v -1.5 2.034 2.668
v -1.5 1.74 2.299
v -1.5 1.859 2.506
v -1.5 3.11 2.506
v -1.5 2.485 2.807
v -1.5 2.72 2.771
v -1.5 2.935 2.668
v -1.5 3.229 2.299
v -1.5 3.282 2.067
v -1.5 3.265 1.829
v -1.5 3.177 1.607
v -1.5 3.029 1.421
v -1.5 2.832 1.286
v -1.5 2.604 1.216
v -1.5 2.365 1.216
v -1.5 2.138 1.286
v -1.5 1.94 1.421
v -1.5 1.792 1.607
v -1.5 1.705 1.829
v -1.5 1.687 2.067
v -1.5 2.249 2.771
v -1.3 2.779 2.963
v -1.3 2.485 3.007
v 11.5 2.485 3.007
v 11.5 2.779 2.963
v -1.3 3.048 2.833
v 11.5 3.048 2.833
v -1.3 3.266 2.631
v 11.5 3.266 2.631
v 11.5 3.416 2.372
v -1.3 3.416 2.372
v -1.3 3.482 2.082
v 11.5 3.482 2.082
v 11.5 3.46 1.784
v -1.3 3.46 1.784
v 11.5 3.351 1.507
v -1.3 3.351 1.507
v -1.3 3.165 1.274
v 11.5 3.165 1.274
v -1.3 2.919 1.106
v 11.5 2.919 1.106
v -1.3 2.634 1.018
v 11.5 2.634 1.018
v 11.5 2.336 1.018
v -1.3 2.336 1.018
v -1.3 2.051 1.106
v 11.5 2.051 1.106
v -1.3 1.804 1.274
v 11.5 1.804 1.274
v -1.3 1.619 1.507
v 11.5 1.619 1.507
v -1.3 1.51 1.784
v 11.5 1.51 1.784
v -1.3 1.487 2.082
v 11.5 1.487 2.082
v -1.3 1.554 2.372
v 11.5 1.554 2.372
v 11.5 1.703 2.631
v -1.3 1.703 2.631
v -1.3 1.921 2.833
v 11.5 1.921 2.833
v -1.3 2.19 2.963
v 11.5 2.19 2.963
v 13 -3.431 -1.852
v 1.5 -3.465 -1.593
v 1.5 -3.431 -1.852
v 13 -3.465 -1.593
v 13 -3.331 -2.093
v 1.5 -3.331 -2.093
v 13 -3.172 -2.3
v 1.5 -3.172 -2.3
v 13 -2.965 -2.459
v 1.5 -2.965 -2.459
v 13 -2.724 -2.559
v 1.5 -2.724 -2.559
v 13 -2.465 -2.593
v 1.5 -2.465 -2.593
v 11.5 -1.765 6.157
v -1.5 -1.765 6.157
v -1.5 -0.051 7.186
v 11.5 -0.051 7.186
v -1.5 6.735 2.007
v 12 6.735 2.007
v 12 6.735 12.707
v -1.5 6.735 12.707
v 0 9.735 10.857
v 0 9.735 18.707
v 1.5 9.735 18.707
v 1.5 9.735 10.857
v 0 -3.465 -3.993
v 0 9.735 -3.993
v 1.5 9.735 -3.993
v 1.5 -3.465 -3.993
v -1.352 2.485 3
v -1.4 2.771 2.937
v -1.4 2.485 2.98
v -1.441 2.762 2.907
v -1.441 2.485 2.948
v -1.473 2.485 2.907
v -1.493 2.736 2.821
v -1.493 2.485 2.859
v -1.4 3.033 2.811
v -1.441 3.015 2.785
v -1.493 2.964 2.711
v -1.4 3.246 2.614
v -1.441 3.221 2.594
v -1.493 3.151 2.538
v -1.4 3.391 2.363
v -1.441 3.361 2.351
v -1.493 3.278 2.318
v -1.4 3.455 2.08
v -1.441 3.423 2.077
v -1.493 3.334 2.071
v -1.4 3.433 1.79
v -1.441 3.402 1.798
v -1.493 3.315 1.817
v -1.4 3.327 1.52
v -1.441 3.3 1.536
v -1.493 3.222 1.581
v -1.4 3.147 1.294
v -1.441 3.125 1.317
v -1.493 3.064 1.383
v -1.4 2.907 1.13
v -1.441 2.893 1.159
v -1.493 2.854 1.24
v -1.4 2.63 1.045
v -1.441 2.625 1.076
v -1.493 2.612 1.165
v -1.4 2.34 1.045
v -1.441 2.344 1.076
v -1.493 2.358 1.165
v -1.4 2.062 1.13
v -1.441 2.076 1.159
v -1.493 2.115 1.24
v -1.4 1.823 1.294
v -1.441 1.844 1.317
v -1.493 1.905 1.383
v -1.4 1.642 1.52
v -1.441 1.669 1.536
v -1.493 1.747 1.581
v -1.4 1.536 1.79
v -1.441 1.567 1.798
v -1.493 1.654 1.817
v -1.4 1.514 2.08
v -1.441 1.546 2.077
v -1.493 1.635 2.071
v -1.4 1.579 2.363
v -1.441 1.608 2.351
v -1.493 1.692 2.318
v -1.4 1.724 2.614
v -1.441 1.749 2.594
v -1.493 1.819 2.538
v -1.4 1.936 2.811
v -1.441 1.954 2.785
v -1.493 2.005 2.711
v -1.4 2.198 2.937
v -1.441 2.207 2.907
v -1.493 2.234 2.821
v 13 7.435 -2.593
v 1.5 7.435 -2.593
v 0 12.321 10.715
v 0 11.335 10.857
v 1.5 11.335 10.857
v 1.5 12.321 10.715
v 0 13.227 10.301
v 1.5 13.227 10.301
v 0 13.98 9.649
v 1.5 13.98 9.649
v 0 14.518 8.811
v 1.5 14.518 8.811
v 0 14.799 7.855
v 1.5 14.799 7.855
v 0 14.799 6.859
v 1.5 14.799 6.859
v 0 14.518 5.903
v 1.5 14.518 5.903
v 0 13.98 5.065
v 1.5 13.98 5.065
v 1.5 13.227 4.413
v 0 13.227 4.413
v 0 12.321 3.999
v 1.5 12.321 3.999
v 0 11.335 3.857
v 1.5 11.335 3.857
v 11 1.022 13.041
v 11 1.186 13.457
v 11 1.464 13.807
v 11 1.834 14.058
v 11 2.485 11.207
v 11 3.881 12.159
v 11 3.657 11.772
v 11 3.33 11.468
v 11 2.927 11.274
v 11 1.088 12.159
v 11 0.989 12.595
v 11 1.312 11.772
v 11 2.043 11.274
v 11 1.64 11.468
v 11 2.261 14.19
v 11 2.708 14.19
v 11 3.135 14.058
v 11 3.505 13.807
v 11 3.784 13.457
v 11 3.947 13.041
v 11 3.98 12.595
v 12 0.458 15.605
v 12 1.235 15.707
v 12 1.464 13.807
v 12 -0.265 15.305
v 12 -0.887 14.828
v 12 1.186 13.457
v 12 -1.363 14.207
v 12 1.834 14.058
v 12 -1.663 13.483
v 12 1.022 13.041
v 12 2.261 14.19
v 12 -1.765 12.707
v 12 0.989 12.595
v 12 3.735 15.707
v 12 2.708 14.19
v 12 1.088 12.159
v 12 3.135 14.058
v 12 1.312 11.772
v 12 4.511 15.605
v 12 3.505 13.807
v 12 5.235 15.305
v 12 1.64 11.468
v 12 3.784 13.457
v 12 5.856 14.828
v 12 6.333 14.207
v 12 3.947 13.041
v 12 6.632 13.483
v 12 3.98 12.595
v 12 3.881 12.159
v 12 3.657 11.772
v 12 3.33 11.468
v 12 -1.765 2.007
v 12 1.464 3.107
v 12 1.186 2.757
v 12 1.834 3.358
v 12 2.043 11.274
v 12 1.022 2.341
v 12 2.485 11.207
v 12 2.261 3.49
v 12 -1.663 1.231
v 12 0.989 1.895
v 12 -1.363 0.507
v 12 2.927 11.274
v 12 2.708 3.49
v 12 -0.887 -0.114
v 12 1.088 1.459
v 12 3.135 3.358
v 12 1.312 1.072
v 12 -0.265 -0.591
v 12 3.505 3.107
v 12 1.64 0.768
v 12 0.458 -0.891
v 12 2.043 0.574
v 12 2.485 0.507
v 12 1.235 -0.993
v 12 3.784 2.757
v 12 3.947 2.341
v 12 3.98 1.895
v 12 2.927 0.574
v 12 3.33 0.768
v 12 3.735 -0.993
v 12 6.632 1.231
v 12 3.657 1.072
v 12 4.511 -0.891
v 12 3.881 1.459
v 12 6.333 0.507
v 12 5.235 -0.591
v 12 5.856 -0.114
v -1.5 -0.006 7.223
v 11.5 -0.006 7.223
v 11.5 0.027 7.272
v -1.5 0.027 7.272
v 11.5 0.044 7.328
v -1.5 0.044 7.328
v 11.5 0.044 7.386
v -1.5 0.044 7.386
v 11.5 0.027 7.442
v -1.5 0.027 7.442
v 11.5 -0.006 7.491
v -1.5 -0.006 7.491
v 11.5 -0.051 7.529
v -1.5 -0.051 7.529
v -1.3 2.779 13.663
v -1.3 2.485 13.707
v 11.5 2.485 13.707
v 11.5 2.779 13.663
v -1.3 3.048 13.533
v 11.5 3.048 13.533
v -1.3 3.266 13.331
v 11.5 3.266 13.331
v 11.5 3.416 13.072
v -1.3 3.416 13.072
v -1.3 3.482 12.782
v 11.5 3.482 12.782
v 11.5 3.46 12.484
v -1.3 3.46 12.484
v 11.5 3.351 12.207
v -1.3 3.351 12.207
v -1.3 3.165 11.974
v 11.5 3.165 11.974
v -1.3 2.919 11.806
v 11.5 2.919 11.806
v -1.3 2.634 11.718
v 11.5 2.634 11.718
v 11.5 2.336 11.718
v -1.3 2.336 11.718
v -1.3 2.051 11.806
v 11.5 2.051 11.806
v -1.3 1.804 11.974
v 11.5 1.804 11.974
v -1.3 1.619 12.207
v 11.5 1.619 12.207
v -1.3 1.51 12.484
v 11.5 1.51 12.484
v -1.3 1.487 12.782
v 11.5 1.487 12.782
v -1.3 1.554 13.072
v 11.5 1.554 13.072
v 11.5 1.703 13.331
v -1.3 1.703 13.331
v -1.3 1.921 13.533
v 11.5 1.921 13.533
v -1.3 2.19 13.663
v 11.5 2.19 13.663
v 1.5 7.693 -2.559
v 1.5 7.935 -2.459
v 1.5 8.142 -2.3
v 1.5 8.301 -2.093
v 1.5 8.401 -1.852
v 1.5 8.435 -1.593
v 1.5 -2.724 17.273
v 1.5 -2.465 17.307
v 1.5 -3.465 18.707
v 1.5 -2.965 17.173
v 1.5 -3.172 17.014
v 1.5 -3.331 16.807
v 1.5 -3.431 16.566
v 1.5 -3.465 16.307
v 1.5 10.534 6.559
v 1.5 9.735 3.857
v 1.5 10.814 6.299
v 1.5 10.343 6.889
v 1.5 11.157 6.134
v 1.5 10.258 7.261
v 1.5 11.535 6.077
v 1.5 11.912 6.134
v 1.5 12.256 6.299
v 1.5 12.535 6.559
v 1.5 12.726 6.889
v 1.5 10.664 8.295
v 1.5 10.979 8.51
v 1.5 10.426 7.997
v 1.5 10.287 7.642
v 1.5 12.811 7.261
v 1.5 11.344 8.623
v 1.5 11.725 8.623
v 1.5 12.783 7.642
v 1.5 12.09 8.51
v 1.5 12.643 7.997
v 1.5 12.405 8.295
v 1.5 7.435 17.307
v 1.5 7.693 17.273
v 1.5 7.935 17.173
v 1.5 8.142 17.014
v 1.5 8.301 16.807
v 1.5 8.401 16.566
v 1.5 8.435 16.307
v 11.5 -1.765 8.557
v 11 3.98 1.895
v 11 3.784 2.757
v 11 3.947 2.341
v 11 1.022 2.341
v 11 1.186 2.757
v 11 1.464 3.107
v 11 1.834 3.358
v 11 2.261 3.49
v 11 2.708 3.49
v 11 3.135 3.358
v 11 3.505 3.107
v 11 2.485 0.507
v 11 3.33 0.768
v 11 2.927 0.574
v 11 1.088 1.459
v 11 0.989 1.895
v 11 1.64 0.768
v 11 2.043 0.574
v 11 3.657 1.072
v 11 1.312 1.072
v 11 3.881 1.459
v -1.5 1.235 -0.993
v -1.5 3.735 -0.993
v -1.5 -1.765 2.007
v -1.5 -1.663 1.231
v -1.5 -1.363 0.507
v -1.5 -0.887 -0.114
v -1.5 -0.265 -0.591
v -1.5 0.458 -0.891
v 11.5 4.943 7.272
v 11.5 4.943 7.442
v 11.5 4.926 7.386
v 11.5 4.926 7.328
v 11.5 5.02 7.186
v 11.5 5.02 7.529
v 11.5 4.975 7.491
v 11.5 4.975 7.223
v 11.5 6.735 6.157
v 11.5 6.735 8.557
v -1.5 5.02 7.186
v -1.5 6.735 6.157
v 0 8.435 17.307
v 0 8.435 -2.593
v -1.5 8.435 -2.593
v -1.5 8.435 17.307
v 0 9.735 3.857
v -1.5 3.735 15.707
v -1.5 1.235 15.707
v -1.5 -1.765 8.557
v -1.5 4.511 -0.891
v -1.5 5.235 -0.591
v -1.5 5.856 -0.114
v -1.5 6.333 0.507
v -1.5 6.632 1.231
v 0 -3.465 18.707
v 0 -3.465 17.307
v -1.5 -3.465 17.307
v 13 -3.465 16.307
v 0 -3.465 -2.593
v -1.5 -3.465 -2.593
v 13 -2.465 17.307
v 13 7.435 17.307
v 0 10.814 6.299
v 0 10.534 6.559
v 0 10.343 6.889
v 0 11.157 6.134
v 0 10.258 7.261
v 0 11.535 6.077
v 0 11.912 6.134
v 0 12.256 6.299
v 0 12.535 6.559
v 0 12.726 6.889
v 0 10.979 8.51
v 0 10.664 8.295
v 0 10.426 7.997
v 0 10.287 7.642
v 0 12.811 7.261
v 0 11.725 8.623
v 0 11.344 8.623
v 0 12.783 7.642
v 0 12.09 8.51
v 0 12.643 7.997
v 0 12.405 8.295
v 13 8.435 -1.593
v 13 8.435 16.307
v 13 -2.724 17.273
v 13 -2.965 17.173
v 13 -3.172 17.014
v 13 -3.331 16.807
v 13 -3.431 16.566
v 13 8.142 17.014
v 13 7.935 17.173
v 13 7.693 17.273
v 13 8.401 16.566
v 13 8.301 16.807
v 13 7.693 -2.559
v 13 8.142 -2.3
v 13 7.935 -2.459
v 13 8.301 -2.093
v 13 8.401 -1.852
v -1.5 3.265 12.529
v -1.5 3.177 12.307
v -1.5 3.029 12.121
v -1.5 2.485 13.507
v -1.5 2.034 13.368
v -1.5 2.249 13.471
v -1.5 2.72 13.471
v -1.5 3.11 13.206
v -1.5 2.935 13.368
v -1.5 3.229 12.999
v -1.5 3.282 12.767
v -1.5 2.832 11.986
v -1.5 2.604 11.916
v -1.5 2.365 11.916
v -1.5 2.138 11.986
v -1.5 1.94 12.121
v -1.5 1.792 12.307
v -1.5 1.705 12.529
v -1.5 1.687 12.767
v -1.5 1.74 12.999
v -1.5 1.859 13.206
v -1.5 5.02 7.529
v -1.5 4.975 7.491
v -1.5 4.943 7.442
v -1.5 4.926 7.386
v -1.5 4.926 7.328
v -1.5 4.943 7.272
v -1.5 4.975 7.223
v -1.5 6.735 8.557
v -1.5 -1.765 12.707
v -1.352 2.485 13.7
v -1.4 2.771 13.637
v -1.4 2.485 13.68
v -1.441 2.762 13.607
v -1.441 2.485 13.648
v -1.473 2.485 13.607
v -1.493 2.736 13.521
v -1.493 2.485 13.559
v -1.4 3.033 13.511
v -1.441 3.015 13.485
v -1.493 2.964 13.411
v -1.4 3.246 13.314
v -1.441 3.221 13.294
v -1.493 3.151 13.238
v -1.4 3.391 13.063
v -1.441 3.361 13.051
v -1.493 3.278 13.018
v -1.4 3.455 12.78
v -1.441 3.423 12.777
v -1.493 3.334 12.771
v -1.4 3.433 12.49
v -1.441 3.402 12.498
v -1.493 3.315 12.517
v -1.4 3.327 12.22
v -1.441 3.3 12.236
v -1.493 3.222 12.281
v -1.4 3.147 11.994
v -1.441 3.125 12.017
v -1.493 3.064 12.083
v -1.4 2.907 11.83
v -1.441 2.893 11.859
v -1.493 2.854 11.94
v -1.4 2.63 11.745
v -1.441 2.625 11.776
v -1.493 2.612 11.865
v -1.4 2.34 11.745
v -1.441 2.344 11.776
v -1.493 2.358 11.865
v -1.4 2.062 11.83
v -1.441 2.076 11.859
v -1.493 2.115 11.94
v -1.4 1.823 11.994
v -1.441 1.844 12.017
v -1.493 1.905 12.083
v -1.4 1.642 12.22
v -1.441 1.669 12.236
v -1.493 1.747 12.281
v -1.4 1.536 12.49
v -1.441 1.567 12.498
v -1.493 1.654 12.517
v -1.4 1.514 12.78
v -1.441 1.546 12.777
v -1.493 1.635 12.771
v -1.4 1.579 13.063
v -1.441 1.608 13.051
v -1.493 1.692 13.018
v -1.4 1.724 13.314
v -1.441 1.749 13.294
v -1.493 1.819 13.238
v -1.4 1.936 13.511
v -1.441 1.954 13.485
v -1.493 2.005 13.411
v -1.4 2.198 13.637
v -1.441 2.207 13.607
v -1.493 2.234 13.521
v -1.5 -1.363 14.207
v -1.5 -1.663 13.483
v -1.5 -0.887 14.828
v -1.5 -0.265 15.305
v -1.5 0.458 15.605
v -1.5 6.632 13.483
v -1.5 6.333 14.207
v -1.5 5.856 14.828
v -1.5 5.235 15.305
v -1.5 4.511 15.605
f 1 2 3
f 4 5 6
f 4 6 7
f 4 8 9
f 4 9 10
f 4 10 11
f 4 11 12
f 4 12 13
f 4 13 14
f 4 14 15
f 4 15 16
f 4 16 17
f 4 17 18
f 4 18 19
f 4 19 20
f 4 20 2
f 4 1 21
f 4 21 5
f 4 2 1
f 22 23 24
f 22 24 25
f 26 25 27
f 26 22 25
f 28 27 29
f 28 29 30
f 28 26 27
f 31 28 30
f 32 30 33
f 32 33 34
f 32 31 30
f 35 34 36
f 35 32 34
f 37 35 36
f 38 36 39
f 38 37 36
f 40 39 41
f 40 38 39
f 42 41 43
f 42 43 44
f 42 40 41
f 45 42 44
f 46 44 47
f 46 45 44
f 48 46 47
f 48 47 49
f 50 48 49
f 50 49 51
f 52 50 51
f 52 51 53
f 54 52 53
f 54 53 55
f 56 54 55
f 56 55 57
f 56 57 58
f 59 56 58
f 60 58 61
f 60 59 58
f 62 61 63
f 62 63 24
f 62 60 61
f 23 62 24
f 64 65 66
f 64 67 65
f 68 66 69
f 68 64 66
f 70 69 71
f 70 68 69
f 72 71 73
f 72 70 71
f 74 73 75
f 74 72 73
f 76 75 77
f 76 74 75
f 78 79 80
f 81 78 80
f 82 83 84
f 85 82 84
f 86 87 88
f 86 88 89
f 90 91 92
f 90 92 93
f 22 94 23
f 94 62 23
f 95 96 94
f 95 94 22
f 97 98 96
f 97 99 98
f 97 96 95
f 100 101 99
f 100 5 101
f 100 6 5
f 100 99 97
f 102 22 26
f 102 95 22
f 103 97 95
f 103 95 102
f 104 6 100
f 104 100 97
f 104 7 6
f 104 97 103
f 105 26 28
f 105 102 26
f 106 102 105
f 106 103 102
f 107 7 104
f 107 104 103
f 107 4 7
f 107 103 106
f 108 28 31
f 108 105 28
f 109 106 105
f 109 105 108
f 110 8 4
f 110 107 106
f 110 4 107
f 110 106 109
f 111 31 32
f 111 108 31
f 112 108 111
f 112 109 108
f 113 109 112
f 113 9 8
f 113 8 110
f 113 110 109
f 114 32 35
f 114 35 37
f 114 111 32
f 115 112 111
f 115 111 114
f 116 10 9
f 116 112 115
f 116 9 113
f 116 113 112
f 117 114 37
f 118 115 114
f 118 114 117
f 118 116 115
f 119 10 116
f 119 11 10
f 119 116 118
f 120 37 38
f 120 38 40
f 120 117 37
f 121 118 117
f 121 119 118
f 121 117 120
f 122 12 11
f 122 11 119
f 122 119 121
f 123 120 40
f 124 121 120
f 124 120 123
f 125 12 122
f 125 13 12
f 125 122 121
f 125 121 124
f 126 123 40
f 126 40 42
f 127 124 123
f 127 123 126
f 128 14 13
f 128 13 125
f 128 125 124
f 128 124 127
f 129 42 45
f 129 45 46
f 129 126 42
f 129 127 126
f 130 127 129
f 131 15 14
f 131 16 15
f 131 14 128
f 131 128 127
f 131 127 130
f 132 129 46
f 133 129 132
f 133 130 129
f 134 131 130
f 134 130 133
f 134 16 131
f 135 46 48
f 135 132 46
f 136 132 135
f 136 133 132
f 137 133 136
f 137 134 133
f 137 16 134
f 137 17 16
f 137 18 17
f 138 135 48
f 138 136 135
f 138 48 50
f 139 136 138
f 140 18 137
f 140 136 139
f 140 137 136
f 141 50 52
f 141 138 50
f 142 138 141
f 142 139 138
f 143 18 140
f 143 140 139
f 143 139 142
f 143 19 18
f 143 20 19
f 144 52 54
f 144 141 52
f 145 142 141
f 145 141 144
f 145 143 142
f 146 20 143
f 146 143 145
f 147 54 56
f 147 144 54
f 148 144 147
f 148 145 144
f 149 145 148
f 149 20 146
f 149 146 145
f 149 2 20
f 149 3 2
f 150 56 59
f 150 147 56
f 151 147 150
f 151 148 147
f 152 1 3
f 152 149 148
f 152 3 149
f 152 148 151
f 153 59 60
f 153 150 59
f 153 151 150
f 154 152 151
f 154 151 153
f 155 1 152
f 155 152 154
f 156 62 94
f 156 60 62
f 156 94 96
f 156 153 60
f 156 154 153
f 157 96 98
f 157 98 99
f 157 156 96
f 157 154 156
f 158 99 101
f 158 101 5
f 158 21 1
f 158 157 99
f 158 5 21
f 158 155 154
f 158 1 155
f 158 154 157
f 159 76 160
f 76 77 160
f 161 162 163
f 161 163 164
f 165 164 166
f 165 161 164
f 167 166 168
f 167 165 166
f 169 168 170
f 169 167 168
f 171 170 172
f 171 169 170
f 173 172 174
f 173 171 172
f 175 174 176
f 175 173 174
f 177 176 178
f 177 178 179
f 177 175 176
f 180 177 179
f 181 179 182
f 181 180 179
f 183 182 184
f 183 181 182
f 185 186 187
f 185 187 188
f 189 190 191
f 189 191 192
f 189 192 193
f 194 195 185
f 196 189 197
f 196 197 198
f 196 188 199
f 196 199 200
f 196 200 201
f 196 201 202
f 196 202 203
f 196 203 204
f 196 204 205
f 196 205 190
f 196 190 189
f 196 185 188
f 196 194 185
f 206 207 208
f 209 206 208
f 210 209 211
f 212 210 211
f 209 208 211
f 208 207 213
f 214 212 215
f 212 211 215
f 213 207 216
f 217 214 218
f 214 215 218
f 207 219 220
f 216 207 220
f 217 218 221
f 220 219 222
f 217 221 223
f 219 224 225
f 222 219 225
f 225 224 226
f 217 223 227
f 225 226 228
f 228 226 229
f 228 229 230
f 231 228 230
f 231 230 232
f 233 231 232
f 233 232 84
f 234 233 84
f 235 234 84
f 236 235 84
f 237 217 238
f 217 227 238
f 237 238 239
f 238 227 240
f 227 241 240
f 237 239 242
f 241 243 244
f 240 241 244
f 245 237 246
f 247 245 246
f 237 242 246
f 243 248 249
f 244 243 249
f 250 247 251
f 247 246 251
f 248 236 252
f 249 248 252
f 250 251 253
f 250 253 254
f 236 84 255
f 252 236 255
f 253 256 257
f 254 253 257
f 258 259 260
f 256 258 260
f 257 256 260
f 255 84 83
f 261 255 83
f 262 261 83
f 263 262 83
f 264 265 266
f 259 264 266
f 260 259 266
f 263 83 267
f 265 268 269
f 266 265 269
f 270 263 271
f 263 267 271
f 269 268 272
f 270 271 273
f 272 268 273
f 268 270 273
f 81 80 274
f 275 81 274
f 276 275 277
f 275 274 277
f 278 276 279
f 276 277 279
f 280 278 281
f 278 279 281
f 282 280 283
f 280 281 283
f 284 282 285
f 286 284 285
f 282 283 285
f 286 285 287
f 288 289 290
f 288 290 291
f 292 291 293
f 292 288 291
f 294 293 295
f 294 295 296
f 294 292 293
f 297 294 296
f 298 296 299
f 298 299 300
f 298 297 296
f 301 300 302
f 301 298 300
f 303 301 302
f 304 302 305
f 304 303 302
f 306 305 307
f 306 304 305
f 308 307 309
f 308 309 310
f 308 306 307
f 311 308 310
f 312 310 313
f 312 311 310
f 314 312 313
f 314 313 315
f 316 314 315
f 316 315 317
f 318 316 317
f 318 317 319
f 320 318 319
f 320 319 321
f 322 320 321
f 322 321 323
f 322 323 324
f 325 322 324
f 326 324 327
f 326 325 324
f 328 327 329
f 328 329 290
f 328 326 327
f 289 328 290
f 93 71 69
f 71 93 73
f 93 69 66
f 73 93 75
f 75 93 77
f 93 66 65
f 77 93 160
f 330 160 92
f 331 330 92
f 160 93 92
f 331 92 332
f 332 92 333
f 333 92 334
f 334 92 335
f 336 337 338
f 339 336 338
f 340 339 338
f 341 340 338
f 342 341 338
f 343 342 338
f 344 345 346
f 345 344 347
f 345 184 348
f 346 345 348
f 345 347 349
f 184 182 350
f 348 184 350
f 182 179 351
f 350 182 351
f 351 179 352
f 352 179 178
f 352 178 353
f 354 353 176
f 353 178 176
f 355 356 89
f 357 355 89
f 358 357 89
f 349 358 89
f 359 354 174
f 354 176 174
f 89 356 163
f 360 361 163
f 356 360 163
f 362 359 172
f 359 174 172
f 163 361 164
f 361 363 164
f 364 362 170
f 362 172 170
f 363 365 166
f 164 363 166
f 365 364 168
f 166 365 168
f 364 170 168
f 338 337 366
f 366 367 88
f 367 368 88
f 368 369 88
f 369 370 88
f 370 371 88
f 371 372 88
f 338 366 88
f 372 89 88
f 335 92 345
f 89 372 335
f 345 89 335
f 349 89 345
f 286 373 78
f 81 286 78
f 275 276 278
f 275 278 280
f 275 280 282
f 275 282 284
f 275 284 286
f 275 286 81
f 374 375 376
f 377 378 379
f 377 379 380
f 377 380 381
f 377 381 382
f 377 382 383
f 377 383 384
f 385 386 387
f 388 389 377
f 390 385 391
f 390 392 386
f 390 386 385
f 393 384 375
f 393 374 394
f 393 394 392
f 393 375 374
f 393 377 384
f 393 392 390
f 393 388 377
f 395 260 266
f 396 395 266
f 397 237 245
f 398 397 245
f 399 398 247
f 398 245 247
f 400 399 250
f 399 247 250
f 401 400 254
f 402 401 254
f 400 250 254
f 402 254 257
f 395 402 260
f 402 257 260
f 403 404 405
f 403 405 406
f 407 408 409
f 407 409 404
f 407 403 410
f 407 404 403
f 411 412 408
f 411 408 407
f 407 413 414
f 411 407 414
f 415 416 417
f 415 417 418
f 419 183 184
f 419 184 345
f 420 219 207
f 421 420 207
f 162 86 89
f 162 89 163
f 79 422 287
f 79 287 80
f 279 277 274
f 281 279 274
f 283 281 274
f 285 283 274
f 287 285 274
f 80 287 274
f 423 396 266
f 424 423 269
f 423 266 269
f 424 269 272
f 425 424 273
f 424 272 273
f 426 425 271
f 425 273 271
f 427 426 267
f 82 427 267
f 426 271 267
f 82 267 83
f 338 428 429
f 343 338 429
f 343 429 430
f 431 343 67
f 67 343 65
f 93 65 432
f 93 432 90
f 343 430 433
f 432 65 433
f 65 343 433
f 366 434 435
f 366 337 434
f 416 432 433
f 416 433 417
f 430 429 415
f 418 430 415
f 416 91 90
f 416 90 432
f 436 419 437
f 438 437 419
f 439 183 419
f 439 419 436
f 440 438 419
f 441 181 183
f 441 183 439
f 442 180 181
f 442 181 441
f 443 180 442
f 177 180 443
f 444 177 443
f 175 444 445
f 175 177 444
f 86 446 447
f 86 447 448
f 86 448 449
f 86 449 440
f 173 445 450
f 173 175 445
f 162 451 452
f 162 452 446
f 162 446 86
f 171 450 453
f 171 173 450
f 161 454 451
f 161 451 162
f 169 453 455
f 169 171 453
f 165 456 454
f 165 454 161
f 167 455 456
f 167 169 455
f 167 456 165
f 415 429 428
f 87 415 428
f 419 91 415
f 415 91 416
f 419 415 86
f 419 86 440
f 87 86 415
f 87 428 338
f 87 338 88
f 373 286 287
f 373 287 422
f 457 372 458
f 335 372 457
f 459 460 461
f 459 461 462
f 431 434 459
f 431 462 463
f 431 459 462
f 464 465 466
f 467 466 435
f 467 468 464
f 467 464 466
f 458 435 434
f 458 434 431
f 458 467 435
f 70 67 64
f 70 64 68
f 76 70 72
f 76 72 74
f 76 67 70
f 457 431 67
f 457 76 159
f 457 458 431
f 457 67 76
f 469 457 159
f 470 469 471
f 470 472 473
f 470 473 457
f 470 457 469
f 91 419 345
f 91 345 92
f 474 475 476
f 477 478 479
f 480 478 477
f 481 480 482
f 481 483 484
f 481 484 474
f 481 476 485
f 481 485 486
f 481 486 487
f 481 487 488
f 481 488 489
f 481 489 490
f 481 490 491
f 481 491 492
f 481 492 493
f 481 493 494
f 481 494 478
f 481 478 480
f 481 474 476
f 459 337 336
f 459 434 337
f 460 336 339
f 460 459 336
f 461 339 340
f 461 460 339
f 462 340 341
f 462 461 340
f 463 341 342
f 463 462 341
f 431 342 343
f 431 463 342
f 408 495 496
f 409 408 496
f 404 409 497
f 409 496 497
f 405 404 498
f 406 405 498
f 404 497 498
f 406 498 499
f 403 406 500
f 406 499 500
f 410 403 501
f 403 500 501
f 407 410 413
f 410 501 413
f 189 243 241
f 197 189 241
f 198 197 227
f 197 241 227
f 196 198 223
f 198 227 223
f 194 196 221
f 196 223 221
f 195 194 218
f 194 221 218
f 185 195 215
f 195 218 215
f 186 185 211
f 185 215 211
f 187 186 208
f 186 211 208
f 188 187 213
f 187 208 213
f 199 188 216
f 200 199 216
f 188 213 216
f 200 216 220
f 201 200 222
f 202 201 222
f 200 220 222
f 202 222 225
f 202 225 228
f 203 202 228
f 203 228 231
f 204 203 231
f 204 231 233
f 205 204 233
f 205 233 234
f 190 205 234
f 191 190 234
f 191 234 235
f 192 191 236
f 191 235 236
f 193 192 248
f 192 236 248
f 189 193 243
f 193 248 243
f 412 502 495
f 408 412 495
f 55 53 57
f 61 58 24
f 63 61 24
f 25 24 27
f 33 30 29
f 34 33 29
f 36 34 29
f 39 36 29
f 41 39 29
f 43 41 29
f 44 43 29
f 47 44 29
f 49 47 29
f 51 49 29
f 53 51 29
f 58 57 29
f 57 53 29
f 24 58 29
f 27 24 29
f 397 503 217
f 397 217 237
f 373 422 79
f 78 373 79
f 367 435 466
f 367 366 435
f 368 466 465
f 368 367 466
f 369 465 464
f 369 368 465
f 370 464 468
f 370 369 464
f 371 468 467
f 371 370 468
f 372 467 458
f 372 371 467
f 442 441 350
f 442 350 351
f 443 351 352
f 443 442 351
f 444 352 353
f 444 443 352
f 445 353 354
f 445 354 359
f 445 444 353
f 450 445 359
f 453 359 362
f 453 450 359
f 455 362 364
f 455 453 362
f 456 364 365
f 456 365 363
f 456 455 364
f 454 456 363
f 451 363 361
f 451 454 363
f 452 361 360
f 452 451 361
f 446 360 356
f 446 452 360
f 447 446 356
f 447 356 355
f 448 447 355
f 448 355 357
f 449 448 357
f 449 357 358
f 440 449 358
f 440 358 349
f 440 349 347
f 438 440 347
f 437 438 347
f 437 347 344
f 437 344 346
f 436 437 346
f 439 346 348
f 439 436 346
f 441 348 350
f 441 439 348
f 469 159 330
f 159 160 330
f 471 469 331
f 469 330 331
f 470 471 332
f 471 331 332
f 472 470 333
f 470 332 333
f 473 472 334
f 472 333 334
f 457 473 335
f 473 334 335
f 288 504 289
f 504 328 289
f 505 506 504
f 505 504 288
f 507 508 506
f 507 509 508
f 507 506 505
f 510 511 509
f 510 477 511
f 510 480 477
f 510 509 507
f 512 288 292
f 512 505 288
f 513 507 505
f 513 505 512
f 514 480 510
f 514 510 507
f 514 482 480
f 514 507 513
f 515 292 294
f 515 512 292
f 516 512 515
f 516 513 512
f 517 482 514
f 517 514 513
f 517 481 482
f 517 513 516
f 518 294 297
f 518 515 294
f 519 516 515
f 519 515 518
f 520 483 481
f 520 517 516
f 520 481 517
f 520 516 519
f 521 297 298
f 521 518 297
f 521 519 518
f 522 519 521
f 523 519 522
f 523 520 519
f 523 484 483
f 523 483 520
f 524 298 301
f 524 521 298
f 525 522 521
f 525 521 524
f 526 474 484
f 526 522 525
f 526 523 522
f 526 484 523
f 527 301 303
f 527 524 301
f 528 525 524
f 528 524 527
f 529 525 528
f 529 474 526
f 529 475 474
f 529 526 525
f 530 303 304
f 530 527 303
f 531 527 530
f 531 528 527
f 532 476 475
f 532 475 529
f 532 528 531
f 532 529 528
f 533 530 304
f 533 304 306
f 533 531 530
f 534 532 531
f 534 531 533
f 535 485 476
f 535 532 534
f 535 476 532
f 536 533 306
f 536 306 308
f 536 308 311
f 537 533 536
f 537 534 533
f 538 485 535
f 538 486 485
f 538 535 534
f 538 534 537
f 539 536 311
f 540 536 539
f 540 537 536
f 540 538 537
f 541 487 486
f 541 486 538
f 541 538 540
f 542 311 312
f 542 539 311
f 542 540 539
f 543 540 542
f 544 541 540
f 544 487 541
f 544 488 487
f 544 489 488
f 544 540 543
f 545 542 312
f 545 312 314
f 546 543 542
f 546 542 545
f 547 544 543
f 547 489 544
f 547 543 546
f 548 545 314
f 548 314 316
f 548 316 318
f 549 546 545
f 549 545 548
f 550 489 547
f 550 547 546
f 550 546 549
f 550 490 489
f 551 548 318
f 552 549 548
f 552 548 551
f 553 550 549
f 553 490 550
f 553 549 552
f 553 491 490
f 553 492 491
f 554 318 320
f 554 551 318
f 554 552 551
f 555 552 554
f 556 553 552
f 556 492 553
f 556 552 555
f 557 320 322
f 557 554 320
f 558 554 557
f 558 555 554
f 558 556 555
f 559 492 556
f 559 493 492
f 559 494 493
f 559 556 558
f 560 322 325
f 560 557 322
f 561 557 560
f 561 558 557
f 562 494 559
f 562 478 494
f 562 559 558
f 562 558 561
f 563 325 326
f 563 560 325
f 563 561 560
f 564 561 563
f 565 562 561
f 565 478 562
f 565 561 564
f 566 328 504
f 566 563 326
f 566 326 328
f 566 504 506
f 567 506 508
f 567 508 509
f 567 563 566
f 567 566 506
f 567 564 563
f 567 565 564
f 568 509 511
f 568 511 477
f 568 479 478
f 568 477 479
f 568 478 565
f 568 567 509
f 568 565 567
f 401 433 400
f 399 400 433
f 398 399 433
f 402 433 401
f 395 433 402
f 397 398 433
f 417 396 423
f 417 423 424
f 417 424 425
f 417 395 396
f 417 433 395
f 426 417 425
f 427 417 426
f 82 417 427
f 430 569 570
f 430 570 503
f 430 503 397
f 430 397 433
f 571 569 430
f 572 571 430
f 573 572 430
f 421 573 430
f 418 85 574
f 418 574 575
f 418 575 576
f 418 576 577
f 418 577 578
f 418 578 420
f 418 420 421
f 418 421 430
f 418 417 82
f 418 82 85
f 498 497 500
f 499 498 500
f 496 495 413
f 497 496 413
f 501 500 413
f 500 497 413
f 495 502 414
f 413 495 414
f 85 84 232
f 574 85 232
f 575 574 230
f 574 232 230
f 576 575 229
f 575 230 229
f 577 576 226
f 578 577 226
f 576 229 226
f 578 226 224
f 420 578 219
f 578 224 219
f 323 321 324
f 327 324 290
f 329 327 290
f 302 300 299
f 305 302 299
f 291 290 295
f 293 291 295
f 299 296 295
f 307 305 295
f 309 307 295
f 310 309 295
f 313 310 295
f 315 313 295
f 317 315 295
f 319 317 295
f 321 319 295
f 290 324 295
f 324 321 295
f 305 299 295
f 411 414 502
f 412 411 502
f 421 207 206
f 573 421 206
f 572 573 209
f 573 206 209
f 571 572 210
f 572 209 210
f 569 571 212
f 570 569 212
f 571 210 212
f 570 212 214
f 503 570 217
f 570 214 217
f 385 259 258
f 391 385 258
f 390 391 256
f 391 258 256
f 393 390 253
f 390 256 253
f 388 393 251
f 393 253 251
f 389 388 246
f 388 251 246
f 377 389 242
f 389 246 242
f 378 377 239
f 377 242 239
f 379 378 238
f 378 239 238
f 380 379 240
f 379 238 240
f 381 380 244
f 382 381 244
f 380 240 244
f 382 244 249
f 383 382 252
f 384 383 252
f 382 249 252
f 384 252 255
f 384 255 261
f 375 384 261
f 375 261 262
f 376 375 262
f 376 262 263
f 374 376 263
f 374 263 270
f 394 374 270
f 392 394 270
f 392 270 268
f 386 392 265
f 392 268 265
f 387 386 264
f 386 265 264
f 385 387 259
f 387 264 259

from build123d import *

# Parameters (mm, degrees)
SKETCH_1_R           = 1.28
SKETCH_1_W           = 19.318640657
SKETCH_1_H           = 10.053241434
EXTRUDE_1_DEPTH      = 1.5
EXTRUDE_2_DEPTH      = 1.5
EXTRUDE_2_DEPTH_BACK = 12
SKETCH_2_W           = 19.9
SKETCH_2_H           = 11.9
SKETCH_3_R           = 1
EXTRUDE_4_DEPTH      = 13
EXTRUDE_4_2_DEPTH    = 13
EXTRUDE_4_3_DEPTH    = 13
EXTRUDE_4_4_DEPTH    = 13
SKETCH_10_W          = 19.9
SKETCH_10_H          = 11.9
EXTRUDE_6_DEPTH      = 1
FILLET_2_R           = 1
SKETCH_11_R          = 1.5
EXTRUDE_7_DEPTH      = 1
FILLET_3_R           = 0.2
FILLET_4_R           = 0.2


with BuildPart() as part:
    # 草图1 → 凸台-拉伸1 (new body)
    with BuildSketch(Plane(origin=(0, 0, 0), x_dir=(0, 0, -1), z_dir=(1, 0, 0))):
        with BuildLine():
            Line((-3.857017018, 9.734638091), (3.992982982, 9.734638091))
            Line((3.992982982, 9.734638091), (3.992982982, -3.465361909))
            Line((3.992982982, -3.465361909), (-18.707017018, -3.465361909))
            Line((-18.707017018, -3.465361909), (-18.707017018, 9.734638091))
            Line((-18.707017018, 9.734638091), (-10.857017018, 9.734638091))
            Line((-10.857017018, 9.734638091), (-10.857017018, 11.334638091))
            ThreePointArc((-10.857017018, 11.334638091), (-7.357017018, 14.834638091), (-3.857017018, 11.334638091))
            Line((-3.857017018, 11.334638091), (-3.857017018, 9.734638091))
        make_face()
        with Locations((-7.357017018, 11.534638091)):
            Circle(SKETCH_1_R, mode=Mode.SUBTRACT)
        with Locations((-7.500203857, 3.102012995)):
            Rectangle(SKETCH_1_W, SKETCH_1_H, mode=Mode.SUBTRACT)
    extrude(amount=EXTRUDE_1_DEPTH)

    # 草图2 → 凸台-拉伸2 (add, two sides: drawn at the far end of the back side and taken through both)
    with BuildSketch(Plane.ZY.offset(-EXTRUDE_2_DEPTH_BACK)):
        with Locations((7.357017018, 2.484638091)):
            Rectangle(SKETCH_2_W, SKETCH_2_H)
        with BuildLine():
            Line((2.007017018, 6.734638091), (12.707017018, 6.734638091))
            ThreePointArc((12.707017018, 6.734638091), (14.828337361, 5.855958435), (15.707017018, 3.734638091))
            Line((15.707017018, 3.734638091), (15.707017018, 1.234638091))
            ThreePointArc((15.707017018, 1.234638091), (14.828337361, -0.886682253), (12.707017018, -1.765361909))
            Line((12.707017018, -1.765361909), (2.007017018, -1.765361909))
            ThreePointArc((2.007017018, -1.765361909), (-0.114303326, -0.886682253), (-0.992982982, 1.234638091))
            Line((-0.992982982, 1.234638091), (-0.992982982, 3.734638091))
            ThreePointArc((-0.992982982, 3.734638091), (-0.114303326, 5.855958435), (2.007017018, 6.734638091))
        make_face(mode=Mode.SUBTRACT)
    extrude(amount=EXTRUDE_2_DEPTH + EXTRUDE_2_DEPTH_BACK)

    # 草图10 → 凸台-拉伸6 (add)
    with BuildSketch(Plane(origin=(12, 0, 0), x_dir=(0, 0, -1), z_dir=(1, 0, 0))):
        with Locations((-7.357017018, 2.484638091)):
            Rectangle(SKETCH_10_W, SKETCH_10_H)
    extrude(amount=EXTRUDE_6_DEPTH)

    # 圆角2
    fillet_2_edges = [part.edges().sort_by_distance(p)[0] for p in [
        (7.25, -3.465361909, 17.307017018),
        (7.25, 8.434638091, -2.592982982),
        (7.25, -3.465361909, -2.592982982),
        (7.25, 8.434638091, 17.307017018),
    ]]
    fillet(fillet_2_edges, radius=FILLET_2_R)

    # 草图11 → 凸台-拉伸7 (add)
    with BuildSketch(Plane.ZY.offset(-12)):
        with Locations(Location((2.007017018, 2.484638091, 0), (0, 0, 180))):
            Circle(SKETCH_11_R)
        with Locations(Location((12.707017018, 2.484638091, 0), (0, 0, 180))):
            Circle(SKETCH_11_R)
    extrude(amount=EXTRUDE_7_DEPTH)


with BuildPart() as body_2:
    # 草图3 → 凸台-拉伸4 (new body)
    with BuildSketch(Plane.ZY.offset(1.5)):
        with Locations((2.007017018, 2.484638091)):
            Circle(SKETCH_3_R)
    extrude(amount=-EXTRUDE_4_DEPTH)

    # 圆角3
    fillet_3_edges = [body_2.edges().sort_by_distance(p)[0] for p in [
        (-1.5, 2.484638091, 1.007017018),
    ]]
    fillet(fillet_3_edges, radius=FILLET_3_R)


with BuildPart() as body_3:
    # 草图3 → Extrude 4 2 (new body)
    with BuildSketch(Plane.ZY.offset(1.5)):
        with Locations((12.707017018, 2.484638091)):
            Circle(SKETCH_3_R)
    extrude(amount=-EXTRUDE_4_2_DEPTH)

    # 圆角4
    fillet_4_edges = [body_3.edges().sort_by_distance(p)[0] for p in [
        (-1.5, 2.484638091, 11.707017018),
    ]]
    fillet(fillet_4_edges, radius=FILLET_4_R)


with BuildPart() as body_4:
    # 草图3 → Extrude 4 3 (new body)
    with BuildSketch(Plane.ZY.offset(1.5)):
        with BuildLine():
            Line((8.557017018, 6.734638091), (7.528515603, 5.020469066))
            ThreePointArc((7.528515603, 5.020469066), (7.357017018, 4.923368217), (7.185518432, 5.020469066))
            Line((7.185518432, 5.020469066), (6.157017018, 6.734638091))
            Line((6.157017018, 6.734638091), (8.557017018, 6.734638091))
        make_face()
    extrude(amount=-EXTRUDE_4_3_DEPTH)


with BuildPart() as body_5:
    # 草图3 → Extrude 4 4 (new body)
    with BuildSketch(Plane.ZY.offset(1.5)):
        with BuildLine():
            Line((6.157017018, -1.765361909), (7.185518432, -0.051192884))
            ThreePointArc((7.185518432, -0.051192884), (7.357017018, 0.045907965), (7.528515603, -0.051192884))
            Line((7.528515603, -0.051192884), (8.557017018, -1.765361909))
            Line((8.557017018, -1.765361909), (6.157017018, -1.765361909))
        make_face()
    extrude(amount=-EXTRUDE_4_4_DEPTH)


solid = Compound([part.part, body_2.part, body_3.part, body_4.part, body_5.part])
